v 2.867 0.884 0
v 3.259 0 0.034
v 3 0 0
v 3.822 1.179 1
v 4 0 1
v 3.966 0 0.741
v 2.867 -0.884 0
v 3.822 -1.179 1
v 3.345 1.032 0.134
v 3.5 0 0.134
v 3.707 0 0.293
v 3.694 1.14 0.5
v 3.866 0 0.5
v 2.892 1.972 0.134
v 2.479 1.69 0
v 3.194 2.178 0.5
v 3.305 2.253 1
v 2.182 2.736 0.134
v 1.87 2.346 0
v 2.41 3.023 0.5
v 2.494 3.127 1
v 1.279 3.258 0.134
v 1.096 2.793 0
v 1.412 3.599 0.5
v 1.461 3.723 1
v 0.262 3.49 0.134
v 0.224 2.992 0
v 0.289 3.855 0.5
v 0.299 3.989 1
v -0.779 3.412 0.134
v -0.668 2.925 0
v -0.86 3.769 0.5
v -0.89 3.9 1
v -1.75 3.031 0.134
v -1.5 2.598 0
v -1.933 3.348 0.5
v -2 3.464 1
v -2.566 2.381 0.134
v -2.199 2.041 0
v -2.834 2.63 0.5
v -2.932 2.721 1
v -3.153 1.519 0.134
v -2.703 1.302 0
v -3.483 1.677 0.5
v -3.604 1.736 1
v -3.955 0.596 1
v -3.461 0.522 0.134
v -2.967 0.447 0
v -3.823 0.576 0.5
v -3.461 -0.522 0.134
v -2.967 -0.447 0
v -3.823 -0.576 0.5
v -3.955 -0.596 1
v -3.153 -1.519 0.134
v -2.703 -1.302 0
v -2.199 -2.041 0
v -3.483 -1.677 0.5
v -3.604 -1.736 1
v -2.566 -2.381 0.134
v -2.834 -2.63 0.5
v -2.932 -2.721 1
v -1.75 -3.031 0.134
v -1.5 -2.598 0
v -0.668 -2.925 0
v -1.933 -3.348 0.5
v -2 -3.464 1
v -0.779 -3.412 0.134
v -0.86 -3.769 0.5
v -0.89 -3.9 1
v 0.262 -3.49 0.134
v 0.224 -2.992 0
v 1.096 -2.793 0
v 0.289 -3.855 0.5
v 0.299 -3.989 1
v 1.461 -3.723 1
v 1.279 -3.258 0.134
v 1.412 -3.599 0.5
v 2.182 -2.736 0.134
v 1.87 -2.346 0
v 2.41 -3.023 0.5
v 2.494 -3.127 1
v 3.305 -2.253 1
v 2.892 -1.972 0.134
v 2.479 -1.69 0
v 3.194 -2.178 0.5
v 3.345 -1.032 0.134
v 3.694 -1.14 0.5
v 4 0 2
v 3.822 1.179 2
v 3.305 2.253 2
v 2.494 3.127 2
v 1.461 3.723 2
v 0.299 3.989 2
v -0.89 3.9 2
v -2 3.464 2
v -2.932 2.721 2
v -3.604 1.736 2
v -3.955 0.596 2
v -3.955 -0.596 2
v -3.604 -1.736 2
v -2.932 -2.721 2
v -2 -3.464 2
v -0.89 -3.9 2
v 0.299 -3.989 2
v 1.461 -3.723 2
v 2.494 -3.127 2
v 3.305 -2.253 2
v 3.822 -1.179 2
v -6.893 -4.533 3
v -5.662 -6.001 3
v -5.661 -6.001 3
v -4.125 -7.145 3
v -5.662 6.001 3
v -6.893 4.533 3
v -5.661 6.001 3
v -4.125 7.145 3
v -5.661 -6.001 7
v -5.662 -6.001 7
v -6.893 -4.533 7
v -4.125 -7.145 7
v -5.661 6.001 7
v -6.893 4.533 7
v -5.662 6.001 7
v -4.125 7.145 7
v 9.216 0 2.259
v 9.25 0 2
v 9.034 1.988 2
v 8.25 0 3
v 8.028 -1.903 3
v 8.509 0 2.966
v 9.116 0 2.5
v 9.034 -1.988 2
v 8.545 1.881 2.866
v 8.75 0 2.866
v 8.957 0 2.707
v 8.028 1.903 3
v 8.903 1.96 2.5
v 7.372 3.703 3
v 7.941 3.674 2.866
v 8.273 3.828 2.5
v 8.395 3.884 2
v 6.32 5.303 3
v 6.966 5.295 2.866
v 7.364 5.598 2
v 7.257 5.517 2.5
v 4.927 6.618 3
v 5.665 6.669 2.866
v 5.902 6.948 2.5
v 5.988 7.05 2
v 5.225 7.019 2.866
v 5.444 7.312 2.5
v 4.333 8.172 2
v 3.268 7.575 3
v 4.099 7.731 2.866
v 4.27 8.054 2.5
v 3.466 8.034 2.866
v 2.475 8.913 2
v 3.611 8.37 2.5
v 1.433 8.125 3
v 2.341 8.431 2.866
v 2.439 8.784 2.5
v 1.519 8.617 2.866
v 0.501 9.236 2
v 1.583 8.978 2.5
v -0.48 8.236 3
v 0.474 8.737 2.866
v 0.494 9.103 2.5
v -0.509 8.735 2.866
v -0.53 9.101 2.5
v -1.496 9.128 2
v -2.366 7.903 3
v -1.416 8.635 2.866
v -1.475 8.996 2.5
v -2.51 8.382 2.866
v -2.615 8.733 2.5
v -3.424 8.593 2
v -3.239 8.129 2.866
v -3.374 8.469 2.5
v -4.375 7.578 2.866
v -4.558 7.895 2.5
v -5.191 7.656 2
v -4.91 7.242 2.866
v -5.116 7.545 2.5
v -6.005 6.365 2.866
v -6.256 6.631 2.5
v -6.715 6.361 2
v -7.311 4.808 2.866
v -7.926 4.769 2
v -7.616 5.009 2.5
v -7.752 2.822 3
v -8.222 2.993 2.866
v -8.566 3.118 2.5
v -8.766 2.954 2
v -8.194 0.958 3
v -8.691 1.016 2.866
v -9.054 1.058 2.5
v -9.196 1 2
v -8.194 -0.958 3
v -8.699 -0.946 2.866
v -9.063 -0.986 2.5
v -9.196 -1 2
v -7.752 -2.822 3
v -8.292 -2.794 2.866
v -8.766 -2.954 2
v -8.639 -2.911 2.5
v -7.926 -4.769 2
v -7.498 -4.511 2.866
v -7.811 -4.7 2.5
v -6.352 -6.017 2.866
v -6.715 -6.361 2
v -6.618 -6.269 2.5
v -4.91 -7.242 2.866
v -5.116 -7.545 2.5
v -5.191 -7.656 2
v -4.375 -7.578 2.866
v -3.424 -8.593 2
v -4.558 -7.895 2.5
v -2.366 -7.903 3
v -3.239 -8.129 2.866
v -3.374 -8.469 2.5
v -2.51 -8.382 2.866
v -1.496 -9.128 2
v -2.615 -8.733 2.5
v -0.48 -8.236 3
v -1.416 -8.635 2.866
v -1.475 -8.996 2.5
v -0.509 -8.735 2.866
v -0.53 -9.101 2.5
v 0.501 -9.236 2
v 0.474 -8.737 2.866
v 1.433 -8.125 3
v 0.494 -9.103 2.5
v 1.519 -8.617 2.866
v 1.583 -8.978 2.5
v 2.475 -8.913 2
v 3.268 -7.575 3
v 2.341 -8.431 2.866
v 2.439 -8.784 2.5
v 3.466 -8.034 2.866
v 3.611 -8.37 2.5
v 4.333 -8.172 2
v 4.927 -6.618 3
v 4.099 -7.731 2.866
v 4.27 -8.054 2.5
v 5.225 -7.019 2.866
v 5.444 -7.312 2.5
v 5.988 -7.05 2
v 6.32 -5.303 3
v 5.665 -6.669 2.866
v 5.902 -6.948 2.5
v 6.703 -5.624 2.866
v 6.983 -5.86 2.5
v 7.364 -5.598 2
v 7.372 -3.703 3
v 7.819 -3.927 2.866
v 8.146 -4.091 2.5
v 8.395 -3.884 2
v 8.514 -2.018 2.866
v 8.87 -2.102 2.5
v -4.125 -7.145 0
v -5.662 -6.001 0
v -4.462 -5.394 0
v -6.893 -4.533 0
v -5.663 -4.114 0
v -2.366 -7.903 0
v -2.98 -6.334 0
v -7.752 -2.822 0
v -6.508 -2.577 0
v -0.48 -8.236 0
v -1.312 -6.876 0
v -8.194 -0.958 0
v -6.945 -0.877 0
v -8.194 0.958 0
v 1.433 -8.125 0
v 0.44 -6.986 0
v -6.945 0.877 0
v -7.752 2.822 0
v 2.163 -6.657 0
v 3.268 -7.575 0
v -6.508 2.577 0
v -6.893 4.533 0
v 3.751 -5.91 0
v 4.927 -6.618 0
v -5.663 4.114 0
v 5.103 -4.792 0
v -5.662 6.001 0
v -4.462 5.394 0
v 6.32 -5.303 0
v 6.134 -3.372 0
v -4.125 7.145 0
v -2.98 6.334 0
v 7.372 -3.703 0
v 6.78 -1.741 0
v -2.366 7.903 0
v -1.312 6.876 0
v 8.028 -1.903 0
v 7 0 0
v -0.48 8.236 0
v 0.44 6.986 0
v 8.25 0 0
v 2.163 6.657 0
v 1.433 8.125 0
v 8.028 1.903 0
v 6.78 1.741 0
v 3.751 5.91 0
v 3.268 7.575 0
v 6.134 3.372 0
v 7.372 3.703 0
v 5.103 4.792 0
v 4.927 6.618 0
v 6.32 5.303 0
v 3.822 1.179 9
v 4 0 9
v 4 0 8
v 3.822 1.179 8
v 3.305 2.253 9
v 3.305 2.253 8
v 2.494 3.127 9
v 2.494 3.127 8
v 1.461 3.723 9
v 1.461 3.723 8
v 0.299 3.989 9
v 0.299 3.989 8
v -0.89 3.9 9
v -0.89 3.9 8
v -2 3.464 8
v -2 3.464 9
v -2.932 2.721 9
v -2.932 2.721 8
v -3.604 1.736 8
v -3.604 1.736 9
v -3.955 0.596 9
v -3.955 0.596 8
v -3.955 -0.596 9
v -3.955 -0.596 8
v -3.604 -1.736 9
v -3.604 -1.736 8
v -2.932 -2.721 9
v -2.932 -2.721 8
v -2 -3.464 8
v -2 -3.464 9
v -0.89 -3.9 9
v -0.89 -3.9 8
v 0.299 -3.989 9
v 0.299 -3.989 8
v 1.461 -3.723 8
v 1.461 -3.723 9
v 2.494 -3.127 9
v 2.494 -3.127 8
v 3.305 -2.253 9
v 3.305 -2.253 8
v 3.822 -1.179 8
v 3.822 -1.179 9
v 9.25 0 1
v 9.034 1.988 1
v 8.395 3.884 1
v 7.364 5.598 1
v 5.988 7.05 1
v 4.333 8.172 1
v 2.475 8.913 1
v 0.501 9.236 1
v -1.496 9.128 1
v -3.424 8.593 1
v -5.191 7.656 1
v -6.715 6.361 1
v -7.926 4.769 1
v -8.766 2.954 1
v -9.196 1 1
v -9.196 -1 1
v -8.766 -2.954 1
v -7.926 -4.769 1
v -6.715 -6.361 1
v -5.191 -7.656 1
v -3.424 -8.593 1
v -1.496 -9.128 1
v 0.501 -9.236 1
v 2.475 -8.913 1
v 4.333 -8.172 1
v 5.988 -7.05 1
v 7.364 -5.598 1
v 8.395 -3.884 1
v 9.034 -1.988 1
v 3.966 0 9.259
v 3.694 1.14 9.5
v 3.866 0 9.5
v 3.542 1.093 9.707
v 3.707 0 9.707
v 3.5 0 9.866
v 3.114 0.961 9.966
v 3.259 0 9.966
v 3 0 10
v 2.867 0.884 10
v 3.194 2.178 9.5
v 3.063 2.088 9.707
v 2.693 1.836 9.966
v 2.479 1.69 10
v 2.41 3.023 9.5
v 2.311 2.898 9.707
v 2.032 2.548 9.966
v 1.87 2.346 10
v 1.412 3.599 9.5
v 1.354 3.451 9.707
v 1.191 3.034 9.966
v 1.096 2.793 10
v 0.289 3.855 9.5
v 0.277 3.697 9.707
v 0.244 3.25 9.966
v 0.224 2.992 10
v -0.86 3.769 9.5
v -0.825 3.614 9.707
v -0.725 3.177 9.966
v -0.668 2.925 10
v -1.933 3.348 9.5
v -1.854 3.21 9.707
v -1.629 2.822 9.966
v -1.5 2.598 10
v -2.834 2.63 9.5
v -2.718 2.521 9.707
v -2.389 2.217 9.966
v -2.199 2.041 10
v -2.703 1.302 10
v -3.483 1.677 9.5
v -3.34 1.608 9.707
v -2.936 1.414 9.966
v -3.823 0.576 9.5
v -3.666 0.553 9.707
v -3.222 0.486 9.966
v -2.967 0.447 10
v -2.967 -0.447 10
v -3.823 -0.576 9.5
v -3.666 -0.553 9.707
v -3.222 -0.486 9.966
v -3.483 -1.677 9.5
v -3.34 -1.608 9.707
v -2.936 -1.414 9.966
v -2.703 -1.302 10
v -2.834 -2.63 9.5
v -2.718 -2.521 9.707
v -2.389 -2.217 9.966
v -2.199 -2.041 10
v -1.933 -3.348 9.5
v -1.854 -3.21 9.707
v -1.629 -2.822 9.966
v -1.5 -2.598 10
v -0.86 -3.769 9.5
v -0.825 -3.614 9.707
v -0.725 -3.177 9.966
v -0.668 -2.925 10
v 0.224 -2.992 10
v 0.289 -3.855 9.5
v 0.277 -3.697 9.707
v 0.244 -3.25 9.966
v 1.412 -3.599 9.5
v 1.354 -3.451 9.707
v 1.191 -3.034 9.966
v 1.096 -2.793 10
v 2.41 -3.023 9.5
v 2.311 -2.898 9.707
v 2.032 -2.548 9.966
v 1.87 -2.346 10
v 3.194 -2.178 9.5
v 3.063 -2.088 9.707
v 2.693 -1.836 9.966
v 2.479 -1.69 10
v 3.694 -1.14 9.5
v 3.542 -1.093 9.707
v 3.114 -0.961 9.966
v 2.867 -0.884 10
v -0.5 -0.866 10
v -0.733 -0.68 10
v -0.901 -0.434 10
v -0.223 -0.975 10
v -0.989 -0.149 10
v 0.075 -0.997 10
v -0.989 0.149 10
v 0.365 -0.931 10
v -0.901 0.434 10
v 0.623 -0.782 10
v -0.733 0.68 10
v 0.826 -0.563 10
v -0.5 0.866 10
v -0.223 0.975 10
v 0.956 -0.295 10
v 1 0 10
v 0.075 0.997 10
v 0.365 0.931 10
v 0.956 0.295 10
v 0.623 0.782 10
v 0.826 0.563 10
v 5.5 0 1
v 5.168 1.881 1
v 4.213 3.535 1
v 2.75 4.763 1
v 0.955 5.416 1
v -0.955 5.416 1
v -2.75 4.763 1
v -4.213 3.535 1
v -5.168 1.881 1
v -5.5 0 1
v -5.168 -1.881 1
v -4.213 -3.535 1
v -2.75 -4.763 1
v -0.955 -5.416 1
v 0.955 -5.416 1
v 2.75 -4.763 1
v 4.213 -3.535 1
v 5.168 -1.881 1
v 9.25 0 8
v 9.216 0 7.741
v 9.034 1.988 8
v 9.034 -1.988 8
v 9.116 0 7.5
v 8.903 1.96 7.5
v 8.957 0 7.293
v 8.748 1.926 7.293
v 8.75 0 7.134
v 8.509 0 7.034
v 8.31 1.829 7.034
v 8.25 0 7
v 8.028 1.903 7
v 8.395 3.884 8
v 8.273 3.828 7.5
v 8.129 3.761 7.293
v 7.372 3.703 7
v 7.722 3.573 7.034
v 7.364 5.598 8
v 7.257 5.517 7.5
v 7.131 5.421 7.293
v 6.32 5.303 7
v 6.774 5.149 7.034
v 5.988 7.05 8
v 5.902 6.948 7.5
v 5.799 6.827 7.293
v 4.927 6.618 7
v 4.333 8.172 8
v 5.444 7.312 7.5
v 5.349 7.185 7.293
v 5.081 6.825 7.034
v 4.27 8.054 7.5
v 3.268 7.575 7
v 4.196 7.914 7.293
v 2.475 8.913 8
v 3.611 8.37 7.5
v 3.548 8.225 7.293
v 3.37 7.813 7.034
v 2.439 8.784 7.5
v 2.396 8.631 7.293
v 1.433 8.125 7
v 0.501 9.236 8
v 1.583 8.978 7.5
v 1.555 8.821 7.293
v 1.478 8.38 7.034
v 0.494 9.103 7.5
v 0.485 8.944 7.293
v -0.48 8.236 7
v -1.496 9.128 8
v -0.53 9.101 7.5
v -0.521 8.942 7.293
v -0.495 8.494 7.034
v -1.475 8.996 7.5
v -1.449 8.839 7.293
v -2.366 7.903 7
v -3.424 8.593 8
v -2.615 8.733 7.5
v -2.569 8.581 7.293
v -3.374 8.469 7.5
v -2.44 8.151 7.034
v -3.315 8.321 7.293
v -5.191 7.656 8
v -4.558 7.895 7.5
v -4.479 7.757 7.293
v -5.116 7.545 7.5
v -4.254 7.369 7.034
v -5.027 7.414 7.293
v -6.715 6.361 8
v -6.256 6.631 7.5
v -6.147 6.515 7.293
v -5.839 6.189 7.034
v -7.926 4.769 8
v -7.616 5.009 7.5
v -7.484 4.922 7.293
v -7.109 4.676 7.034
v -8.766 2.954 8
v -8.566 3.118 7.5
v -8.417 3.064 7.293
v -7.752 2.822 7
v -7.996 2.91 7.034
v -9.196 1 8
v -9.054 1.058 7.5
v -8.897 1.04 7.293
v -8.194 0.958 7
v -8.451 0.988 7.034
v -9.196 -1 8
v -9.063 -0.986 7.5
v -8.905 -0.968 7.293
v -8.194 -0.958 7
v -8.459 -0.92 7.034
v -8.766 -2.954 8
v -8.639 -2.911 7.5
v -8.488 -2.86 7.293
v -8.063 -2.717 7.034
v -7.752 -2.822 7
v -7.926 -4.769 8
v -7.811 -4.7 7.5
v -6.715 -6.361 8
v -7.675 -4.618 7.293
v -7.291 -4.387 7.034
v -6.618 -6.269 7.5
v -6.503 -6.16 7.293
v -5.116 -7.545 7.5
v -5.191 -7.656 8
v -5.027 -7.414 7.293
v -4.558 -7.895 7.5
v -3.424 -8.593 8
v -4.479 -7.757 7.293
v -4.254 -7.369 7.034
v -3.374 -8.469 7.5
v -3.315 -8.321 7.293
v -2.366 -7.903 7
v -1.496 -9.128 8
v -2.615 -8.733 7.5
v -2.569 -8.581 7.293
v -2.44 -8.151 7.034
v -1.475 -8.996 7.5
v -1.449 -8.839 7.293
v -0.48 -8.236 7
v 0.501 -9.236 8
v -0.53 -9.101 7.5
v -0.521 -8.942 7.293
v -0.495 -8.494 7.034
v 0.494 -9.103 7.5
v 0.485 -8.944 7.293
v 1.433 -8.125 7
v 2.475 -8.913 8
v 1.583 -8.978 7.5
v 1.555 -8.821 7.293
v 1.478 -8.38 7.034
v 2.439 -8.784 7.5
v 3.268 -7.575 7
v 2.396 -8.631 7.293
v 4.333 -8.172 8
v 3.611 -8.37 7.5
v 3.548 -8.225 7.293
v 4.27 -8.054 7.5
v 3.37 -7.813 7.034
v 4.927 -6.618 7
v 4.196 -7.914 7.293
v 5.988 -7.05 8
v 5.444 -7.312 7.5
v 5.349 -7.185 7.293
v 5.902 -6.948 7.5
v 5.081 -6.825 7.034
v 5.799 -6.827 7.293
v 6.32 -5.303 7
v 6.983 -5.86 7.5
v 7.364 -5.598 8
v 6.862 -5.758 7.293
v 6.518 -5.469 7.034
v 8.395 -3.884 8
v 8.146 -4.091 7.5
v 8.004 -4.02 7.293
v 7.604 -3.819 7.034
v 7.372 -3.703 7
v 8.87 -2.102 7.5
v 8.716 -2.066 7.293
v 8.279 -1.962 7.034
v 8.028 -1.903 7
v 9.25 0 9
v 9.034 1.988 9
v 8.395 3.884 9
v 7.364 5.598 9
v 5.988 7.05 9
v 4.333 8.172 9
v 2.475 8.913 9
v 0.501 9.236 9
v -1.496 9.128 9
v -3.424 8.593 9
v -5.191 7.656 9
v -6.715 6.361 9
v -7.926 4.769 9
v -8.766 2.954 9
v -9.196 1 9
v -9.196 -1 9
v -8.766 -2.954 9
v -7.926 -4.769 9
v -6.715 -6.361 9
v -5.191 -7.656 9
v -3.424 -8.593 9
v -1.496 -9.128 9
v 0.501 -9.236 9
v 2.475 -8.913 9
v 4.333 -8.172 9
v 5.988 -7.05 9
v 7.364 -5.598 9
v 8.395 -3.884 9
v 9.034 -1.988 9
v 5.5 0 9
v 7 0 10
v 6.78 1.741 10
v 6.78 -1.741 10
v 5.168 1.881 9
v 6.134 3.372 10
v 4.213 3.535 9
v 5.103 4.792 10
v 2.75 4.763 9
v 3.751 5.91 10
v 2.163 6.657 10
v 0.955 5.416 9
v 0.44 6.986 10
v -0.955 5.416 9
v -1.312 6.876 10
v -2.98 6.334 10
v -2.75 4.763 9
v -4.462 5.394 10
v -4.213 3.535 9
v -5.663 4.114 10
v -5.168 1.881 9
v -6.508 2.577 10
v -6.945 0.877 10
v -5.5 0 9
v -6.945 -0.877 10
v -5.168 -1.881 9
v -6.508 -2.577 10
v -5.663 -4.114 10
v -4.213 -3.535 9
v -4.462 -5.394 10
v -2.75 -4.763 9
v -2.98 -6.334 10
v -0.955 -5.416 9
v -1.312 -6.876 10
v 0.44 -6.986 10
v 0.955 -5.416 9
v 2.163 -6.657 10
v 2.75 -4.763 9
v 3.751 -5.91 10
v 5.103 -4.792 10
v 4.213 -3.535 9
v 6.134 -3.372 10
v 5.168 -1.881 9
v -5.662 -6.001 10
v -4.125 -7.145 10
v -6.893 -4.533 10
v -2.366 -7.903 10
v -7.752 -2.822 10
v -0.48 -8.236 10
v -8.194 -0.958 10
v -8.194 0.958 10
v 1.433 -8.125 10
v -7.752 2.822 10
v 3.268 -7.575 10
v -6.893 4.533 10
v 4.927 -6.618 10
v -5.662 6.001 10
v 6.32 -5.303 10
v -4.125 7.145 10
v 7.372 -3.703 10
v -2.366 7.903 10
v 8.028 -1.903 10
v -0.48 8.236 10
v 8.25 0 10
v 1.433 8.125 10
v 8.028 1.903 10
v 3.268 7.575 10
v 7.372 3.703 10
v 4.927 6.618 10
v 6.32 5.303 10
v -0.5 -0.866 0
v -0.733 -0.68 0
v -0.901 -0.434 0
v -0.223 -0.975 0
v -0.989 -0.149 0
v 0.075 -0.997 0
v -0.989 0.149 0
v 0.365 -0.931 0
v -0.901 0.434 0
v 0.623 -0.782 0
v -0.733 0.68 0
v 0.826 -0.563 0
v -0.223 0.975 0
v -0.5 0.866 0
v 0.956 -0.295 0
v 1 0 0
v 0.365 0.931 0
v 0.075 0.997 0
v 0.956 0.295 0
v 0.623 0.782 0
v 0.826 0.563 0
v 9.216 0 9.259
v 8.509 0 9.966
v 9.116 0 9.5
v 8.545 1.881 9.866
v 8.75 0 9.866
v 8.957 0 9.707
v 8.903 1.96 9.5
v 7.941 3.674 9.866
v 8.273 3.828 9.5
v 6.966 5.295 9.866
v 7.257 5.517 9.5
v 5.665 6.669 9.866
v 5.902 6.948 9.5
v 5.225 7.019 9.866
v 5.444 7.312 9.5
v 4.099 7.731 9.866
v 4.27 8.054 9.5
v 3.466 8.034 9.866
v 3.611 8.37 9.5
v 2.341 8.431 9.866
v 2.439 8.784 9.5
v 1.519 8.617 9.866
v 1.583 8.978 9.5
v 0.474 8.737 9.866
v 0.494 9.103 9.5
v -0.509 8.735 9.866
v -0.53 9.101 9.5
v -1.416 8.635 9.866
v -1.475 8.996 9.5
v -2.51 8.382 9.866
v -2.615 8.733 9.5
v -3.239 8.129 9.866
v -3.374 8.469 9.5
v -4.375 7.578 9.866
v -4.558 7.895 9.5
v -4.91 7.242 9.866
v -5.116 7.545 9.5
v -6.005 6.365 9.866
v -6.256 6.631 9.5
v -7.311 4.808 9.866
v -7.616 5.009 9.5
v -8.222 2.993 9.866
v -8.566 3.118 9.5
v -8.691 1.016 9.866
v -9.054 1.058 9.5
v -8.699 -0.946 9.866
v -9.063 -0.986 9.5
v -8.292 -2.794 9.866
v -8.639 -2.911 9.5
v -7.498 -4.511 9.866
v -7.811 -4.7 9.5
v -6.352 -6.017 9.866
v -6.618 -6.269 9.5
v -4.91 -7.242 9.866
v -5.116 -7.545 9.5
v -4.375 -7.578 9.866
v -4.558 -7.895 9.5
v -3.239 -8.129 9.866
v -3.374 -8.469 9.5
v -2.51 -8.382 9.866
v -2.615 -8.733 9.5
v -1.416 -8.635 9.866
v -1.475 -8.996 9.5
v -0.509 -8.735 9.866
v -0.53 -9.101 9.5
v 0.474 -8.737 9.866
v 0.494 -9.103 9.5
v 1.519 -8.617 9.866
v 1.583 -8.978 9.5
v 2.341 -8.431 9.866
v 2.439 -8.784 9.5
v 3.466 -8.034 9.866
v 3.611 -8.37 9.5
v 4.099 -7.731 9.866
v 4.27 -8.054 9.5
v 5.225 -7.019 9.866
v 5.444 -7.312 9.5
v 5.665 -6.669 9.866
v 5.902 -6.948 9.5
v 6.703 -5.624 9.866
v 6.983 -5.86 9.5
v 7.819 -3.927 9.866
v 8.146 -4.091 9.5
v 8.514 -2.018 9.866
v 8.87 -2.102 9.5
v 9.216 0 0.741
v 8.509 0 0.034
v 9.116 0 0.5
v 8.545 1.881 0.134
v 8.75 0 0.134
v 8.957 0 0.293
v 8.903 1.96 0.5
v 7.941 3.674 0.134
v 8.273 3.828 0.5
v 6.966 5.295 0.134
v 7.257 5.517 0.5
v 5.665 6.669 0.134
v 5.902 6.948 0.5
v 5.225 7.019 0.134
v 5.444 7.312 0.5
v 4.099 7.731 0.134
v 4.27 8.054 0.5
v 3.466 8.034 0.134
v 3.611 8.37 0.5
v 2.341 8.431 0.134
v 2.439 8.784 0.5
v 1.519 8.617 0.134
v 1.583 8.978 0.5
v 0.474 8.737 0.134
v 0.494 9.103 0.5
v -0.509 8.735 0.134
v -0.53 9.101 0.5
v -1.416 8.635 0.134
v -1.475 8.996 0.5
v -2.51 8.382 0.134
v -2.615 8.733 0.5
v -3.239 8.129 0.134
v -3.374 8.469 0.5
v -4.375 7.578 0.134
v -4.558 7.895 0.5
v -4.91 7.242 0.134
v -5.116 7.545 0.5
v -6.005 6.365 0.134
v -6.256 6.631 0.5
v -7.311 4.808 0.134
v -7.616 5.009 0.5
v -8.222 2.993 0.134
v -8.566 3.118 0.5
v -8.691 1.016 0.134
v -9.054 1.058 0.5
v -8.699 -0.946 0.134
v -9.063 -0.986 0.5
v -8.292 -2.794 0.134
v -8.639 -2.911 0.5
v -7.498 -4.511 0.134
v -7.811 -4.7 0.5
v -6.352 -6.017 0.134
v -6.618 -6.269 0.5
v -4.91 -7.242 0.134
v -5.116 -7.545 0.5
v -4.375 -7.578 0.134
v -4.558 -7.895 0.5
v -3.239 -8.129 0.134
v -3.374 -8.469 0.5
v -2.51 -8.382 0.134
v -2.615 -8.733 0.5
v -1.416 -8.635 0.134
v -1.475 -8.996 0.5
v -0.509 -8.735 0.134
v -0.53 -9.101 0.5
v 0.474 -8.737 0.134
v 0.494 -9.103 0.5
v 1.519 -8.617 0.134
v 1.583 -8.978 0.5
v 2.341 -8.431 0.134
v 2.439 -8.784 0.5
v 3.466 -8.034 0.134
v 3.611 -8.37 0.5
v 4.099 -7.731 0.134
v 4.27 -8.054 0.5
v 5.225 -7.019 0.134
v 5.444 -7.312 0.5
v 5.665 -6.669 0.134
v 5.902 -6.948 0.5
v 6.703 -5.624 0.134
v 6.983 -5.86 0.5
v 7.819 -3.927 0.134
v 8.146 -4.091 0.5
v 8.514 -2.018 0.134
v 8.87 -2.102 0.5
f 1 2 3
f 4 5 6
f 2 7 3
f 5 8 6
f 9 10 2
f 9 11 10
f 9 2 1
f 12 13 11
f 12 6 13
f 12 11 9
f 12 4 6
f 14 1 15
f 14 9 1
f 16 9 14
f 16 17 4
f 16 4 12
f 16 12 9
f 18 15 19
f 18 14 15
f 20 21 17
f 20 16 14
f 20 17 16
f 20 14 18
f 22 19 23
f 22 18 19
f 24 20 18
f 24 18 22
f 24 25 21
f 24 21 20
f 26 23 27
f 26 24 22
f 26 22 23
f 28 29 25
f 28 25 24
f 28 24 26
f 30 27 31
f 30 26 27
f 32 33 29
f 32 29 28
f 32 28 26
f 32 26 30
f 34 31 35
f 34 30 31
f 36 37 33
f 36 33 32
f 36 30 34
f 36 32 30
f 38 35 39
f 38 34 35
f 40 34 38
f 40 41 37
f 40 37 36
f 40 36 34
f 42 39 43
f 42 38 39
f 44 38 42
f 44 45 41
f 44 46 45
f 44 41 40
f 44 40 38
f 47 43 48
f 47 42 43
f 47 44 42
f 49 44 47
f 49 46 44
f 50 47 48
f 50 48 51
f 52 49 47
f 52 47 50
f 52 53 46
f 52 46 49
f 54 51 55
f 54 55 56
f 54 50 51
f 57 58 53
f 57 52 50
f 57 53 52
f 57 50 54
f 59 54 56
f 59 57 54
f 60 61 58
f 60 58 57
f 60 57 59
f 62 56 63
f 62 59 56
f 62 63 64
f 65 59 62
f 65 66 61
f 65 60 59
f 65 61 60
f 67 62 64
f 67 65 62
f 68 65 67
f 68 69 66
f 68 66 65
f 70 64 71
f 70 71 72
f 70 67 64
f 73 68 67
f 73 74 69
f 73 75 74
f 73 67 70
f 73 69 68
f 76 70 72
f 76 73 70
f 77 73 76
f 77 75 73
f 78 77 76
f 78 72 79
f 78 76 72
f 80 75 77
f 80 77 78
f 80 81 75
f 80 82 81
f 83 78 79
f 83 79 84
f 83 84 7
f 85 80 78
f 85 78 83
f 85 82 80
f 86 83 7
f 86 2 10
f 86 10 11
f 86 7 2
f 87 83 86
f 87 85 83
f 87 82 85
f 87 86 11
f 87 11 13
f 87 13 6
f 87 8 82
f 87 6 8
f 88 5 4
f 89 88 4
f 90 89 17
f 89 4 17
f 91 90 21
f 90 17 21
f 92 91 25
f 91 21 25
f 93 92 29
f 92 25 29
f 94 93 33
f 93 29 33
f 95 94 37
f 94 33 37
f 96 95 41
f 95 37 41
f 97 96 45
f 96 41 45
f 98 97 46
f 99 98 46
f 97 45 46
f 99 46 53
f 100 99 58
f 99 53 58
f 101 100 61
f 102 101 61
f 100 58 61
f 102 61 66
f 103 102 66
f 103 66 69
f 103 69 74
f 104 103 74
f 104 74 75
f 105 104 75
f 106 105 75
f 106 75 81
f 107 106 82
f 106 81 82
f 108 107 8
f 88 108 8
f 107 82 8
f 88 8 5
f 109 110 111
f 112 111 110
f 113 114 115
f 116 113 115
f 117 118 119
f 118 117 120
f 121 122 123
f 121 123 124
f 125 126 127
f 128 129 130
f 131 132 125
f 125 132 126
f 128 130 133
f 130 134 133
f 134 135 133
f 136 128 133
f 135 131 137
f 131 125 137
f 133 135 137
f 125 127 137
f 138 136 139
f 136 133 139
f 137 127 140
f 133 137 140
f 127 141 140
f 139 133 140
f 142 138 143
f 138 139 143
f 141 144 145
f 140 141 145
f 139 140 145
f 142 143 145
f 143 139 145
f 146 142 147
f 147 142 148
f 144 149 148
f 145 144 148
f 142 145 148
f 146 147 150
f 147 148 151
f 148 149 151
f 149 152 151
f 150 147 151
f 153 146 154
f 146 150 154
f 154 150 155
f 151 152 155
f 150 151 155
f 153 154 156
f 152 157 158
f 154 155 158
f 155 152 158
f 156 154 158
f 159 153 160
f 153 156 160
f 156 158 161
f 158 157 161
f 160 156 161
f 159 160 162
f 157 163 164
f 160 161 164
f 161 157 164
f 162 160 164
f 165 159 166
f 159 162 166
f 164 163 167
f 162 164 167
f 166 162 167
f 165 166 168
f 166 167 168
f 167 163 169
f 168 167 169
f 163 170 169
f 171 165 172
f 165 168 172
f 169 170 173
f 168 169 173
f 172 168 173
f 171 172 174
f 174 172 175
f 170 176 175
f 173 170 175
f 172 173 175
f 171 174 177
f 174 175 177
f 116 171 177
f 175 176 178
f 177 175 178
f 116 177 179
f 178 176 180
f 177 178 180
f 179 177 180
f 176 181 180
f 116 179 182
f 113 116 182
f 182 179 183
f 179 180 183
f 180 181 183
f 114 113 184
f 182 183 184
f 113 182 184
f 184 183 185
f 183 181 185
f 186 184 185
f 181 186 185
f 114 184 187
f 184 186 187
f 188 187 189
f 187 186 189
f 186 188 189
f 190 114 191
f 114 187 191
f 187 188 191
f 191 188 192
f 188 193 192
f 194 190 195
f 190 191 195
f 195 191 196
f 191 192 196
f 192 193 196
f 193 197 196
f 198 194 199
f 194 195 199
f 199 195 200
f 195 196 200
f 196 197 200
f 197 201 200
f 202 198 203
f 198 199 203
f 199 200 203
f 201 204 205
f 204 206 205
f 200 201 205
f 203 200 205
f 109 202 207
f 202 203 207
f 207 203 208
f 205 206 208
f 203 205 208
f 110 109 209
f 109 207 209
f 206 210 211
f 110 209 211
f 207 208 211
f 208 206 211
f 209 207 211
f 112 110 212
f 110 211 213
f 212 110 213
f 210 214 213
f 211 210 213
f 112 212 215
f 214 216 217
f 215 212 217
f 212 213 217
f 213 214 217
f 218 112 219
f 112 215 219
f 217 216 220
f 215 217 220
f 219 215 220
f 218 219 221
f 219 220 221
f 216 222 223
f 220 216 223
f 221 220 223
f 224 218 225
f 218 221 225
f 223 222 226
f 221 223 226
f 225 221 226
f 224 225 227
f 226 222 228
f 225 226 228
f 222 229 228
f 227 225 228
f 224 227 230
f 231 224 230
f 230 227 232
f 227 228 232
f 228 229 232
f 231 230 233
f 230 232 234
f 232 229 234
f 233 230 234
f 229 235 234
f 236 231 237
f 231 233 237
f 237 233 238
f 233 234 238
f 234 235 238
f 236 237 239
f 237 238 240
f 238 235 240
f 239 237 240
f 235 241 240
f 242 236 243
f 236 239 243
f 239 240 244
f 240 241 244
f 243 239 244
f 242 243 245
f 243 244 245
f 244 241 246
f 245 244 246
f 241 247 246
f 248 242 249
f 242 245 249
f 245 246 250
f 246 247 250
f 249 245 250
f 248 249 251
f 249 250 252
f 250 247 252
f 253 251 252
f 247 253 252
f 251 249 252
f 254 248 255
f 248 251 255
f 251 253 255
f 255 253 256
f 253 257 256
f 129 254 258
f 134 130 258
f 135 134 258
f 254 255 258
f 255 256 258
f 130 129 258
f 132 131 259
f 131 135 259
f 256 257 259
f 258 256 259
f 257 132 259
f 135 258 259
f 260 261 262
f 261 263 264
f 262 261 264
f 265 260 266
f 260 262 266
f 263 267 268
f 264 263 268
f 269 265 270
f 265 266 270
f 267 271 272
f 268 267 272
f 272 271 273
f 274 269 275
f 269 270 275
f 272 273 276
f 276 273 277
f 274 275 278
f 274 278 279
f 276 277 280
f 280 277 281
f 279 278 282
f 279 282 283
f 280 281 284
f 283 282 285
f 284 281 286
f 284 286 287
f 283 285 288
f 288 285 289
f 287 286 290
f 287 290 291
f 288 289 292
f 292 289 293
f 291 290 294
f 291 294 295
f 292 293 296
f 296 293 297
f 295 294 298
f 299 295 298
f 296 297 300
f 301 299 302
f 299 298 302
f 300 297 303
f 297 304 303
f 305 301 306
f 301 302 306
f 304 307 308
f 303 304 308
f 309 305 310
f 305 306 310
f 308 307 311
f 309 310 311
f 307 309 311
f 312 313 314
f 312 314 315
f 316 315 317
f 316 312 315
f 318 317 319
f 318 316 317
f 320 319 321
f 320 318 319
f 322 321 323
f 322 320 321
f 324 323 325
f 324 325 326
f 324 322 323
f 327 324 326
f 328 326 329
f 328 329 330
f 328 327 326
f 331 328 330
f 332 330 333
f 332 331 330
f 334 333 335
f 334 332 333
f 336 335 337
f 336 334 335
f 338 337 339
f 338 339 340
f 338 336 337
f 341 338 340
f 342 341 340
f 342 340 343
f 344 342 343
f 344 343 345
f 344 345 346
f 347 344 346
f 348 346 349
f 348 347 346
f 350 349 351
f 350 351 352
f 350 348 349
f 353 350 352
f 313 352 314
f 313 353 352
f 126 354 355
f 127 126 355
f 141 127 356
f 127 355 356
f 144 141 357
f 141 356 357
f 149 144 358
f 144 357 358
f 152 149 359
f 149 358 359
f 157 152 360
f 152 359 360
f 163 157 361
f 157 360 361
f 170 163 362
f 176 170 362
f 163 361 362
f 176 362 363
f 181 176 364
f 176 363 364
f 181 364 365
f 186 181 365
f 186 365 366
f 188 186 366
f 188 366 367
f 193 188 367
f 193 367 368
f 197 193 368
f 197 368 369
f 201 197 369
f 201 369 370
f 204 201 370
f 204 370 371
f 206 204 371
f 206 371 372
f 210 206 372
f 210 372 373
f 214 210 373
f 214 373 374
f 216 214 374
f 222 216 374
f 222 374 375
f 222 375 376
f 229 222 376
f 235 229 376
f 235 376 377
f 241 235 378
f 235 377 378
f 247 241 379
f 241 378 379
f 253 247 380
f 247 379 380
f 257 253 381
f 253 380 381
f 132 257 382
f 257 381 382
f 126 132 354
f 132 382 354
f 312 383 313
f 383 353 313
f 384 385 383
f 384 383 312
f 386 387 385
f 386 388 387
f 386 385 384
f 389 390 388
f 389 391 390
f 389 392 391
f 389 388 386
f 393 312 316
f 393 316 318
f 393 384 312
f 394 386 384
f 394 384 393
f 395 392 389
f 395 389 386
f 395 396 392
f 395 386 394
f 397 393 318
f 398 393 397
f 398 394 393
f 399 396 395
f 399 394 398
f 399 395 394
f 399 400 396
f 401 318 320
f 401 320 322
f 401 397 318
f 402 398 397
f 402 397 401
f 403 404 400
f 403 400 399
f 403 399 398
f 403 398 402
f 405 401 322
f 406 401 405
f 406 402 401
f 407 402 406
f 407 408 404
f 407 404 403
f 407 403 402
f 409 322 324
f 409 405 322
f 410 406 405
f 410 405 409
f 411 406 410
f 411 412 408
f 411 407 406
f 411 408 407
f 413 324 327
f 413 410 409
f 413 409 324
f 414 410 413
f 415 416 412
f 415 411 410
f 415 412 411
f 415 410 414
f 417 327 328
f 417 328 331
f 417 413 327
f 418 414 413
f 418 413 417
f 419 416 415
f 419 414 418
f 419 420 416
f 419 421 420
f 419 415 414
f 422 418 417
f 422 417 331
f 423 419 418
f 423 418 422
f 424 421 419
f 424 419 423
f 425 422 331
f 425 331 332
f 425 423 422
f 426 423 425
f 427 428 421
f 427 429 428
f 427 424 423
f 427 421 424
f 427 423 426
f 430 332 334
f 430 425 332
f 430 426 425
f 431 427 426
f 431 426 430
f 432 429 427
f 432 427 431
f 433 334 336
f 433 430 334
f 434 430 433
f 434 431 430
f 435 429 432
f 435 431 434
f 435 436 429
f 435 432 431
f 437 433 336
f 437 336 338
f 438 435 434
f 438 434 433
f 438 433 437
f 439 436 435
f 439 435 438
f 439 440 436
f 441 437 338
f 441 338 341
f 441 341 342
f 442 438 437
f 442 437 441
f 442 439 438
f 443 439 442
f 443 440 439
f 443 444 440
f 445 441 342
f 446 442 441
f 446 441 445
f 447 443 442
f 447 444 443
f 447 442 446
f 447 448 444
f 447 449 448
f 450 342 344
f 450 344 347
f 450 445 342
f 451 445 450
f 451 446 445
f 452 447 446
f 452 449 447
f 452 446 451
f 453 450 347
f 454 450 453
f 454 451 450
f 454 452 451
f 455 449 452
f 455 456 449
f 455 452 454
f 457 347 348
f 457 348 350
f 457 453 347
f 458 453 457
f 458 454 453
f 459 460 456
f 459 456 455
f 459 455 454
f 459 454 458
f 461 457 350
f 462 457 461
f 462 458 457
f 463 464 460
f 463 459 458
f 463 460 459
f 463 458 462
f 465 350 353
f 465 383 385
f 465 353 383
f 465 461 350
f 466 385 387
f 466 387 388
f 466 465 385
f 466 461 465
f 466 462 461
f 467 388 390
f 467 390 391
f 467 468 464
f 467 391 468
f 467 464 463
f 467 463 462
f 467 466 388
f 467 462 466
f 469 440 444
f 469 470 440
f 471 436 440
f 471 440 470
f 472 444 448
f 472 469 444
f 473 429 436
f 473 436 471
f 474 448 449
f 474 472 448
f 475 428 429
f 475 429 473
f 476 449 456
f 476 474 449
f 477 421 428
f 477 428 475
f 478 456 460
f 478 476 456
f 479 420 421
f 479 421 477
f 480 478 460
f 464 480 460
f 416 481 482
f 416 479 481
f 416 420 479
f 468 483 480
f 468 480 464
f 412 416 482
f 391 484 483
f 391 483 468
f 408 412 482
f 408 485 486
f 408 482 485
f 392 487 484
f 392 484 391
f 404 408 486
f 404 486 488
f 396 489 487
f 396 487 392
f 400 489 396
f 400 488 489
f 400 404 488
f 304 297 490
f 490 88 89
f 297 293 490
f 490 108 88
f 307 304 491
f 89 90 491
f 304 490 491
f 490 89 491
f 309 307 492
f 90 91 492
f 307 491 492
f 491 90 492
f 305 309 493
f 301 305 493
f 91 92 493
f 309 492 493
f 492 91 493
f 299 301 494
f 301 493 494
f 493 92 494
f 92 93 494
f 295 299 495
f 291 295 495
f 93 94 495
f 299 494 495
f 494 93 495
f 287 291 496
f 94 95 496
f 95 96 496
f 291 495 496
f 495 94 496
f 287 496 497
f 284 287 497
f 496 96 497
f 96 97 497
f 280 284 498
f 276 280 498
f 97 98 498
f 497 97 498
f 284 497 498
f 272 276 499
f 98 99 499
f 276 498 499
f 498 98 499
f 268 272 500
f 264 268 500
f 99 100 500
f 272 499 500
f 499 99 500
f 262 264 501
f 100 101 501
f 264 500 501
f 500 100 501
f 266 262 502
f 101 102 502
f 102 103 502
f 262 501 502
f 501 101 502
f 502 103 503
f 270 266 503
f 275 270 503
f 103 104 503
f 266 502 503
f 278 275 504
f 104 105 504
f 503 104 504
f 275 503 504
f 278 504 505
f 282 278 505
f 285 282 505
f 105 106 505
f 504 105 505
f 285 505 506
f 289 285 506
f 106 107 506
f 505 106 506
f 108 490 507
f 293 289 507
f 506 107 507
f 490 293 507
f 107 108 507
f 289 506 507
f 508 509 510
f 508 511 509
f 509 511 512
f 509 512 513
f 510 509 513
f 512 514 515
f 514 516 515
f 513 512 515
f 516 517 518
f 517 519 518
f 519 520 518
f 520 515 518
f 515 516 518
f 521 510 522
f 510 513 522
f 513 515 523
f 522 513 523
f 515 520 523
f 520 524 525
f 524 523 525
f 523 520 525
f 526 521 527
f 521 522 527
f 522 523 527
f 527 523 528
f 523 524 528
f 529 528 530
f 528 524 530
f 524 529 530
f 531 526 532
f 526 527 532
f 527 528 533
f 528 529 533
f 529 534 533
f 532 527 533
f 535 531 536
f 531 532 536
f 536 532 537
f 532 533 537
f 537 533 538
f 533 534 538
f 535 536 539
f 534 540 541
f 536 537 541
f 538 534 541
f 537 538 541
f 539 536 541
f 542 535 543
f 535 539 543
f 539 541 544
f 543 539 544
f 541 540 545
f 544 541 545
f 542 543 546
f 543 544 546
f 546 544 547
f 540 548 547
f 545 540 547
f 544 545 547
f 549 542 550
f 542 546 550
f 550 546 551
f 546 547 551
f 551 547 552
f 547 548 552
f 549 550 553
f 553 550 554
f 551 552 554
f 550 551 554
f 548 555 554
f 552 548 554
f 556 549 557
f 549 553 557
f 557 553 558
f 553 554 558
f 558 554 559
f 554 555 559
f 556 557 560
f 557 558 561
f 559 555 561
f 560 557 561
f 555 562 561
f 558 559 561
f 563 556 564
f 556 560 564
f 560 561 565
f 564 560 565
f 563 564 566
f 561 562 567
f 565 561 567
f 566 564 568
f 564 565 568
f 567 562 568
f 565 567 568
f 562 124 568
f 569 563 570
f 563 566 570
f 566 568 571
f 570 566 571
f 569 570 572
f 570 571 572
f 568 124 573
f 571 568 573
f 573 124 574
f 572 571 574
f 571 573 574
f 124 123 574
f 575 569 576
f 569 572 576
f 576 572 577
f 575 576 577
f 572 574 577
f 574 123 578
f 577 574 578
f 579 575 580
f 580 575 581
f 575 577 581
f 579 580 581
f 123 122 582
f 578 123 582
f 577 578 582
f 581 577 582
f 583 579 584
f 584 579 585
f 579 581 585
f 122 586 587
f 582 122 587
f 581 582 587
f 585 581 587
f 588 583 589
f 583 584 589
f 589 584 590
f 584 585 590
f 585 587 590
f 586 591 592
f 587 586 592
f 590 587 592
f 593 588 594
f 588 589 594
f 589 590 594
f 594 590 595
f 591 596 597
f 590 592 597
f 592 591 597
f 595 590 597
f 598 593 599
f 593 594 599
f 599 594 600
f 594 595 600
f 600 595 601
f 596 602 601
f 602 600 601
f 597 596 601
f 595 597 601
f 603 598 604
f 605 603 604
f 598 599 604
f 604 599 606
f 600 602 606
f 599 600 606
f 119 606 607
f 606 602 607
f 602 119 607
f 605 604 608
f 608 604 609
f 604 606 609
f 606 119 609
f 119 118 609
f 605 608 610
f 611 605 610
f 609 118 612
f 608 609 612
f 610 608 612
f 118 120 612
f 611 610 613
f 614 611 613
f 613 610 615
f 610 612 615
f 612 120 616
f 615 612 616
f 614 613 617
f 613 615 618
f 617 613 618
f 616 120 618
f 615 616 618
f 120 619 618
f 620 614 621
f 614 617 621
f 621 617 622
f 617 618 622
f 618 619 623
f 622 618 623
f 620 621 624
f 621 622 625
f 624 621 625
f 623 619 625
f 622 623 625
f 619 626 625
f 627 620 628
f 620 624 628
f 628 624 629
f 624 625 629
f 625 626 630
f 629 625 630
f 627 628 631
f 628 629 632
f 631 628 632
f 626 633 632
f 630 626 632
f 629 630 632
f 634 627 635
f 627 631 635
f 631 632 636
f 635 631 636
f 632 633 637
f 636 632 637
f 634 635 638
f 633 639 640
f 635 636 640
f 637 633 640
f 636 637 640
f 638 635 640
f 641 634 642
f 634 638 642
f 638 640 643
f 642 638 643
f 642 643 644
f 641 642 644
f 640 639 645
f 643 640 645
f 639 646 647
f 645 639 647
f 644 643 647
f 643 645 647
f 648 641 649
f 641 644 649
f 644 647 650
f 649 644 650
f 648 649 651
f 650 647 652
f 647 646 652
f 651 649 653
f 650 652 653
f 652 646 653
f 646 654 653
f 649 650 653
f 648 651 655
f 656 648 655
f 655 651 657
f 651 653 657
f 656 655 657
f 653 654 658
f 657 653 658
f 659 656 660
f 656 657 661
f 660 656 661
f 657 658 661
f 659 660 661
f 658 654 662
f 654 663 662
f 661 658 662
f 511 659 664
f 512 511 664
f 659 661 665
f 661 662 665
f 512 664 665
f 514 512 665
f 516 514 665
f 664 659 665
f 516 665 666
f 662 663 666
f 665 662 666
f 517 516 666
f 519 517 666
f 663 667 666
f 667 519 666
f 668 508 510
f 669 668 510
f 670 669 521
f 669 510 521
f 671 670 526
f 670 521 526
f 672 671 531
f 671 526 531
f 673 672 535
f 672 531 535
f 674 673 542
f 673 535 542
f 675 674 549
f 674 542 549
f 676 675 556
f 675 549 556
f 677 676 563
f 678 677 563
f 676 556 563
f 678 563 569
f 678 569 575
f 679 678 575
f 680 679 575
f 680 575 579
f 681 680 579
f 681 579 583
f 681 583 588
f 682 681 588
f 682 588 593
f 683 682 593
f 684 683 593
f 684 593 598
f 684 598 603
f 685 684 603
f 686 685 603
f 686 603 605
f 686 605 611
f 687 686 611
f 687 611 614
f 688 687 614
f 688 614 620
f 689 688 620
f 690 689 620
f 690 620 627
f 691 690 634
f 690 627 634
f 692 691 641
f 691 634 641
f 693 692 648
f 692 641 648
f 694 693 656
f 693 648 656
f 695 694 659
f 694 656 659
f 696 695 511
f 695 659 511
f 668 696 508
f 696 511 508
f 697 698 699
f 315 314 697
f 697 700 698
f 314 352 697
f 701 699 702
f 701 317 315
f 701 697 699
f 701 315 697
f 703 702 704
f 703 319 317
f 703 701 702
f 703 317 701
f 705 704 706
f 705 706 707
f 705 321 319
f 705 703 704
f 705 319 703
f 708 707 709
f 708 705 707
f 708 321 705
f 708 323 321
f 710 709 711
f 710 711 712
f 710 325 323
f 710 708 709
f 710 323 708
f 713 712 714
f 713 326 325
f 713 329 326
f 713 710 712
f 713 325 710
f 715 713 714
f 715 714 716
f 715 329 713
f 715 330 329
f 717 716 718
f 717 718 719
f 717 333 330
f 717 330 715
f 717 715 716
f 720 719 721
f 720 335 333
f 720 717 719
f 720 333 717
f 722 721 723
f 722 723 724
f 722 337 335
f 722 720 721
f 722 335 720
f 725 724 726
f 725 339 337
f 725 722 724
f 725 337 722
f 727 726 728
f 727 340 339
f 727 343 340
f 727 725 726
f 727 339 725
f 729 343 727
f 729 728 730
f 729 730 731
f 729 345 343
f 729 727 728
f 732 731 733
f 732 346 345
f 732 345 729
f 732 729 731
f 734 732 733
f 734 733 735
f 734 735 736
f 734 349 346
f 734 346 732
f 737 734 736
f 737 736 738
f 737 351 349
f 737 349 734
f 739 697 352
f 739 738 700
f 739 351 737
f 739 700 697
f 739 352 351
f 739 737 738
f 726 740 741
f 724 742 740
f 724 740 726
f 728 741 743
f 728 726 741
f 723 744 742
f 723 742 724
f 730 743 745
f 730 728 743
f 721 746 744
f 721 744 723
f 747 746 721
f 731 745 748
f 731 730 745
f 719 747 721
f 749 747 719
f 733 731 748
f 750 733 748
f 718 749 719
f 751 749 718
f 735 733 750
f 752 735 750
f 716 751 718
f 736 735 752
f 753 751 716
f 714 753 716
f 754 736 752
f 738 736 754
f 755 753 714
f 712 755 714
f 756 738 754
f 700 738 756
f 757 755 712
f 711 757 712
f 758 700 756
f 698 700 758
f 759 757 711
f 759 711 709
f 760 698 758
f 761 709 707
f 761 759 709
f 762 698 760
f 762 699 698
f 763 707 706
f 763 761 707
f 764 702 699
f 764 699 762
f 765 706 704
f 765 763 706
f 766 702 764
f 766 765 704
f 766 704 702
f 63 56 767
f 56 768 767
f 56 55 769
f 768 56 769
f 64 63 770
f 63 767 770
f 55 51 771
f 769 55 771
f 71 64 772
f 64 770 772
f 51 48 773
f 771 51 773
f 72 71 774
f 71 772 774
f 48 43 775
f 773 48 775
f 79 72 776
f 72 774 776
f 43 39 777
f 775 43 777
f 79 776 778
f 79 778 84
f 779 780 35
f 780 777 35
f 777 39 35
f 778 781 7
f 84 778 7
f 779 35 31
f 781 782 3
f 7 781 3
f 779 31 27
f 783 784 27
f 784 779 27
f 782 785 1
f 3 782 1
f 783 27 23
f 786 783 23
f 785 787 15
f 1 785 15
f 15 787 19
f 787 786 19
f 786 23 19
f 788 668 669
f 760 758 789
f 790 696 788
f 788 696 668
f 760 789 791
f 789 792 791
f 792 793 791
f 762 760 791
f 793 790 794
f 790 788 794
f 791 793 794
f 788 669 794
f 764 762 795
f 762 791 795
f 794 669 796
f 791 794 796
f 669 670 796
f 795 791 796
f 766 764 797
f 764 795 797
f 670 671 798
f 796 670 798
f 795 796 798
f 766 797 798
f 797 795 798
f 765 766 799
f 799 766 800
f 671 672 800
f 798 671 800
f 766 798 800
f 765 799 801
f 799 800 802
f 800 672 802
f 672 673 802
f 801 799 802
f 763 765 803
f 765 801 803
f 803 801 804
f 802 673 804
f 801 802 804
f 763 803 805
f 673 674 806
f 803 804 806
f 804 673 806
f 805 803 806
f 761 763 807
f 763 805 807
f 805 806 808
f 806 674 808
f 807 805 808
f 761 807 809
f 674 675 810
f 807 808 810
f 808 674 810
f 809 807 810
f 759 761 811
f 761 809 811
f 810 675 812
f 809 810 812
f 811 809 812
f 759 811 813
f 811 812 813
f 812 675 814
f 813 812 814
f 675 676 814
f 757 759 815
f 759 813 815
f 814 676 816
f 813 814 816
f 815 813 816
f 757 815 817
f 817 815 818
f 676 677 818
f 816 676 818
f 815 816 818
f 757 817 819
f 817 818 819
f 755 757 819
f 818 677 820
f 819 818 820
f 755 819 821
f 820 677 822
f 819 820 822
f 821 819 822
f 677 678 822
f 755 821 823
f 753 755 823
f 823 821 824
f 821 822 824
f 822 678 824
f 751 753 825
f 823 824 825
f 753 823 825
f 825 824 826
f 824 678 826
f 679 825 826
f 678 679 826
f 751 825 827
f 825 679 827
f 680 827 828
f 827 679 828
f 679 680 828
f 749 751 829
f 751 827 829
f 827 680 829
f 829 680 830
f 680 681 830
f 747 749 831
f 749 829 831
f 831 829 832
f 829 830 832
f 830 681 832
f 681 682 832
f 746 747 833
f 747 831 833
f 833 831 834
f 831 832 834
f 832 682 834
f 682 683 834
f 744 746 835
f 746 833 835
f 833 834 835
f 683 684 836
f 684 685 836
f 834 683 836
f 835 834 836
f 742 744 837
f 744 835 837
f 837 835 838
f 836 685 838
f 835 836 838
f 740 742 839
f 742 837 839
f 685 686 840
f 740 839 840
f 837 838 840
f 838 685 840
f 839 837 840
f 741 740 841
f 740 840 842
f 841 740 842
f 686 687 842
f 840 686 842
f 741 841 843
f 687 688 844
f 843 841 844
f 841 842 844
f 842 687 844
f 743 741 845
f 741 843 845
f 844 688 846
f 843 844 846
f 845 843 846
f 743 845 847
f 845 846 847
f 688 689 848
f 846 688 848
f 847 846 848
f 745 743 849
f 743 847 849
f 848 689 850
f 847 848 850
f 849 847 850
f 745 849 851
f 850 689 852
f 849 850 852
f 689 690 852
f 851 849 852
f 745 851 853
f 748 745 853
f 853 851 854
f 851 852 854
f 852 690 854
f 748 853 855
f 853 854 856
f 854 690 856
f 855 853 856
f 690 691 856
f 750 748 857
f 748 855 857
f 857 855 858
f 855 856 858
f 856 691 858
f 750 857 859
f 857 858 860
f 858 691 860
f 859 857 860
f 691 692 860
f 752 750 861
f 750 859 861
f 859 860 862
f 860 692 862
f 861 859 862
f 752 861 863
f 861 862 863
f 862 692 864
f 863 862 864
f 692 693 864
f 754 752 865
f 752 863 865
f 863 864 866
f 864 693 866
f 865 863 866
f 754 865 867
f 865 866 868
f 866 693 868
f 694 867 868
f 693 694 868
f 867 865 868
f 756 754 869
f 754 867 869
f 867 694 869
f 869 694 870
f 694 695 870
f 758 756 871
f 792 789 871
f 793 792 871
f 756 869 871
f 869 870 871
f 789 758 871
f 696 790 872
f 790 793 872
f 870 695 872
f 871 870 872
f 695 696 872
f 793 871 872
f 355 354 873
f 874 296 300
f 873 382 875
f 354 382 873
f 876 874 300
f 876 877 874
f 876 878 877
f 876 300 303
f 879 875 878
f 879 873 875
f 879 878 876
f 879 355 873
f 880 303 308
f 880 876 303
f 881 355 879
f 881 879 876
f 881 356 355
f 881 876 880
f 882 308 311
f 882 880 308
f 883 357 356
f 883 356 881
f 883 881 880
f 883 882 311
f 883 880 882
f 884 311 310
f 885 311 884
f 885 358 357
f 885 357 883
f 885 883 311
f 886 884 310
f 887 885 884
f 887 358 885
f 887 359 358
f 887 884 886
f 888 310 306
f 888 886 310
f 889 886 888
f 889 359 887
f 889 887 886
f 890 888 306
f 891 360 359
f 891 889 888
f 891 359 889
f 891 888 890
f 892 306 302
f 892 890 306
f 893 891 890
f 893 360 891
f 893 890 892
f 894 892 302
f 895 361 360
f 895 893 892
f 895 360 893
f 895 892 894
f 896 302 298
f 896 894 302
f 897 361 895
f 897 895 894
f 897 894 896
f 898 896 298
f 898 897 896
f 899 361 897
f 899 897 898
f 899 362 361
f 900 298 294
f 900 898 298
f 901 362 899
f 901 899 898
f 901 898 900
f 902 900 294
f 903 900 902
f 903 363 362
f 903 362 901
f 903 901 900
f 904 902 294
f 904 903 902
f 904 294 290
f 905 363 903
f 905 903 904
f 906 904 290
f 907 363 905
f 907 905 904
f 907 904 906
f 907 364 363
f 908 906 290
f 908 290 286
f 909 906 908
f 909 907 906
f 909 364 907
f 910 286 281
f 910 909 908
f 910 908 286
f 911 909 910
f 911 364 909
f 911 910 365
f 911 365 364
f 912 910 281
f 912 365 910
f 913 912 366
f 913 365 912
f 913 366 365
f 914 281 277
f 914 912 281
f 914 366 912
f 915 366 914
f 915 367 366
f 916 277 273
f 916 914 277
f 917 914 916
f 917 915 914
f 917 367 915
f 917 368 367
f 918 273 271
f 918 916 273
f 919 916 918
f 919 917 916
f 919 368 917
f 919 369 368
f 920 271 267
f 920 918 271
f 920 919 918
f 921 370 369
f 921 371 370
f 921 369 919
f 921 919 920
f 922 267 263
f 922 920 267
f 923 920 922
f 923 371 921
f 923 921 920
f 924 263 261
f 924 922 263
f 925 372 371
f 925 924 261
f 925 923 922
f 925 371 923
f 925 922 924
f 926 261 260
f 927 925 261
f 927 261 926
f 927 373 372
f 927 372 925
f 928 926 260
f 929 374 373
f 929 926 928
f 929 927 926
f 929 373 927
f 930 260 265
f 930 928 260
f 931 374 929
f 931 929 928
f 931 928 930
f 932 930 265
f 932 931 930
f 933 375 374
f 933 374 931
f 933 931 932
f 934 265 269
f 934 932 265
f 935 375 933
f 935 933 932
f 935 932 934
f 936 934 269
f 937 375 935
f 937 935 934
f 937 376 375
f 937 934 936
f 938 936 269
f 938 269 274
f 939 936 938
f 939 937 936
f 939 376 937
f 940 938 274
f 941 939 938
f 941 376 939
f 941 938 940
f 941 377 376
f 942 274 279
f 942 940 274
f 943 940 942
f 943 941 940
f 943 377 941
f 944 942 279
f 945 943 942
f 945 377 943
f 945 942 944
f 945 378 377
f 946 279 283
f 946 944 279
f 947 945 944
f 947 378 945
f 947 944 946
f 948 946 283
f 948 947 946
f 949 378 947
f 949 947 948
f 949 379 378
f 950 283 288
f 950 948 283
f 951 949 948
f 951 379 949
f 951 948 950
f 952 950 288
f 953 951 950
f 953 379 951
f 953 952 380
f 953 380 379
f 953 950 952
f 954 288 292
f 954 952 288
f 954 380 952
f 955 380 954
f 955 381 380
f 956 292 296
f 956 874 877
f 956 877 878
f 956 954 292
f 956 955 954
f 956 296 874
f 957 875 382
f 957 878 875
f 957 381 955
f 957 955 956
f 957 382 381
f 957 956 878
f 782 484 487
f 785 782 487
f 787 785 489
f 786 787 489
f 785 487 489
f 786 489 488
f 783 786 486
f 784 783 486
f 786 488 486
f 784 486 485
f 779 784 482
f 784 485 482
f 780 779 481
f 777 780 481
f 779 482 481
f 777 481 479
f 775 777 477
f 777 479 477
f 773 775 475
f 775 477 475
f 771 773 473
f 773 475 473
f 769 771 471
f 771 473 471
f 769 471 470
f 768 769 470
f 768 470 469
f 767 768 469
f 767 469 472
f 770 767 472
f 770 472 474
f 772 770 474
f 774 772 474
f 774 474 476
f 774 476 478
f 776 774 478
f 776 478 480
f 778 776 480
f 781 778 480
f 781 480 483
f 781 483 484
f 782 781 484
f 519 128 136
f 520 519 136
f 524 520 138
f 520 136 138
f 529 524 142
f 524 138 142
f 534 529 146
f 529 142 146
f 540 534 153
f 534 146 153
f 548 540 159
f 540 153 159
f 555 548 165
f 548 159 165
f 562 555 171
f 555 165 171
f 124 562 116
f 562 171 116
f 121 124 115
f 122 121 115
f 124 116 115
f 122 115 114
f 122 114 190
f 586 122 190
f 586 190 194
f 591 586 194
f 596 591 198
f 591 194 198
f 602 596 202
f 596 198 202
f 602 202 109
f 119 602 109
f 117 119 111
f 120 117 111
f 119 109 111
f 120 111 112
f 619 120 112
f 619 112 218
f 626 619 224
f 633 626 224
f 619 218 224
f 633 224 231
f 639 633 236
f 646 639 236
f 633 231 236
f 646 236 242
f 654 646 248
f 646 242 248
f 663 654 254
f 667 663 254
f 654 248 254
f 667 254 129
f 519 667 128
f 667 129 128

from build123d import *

# Parameters (mm, degrees)
F0_R      = 9.25
F0_R_2    = 1
F1_DEPTH  = 10
F4_R      = 7
F3_R      = 4
F8_R      = 7
F7_R      = 4
F11_R     = 4
F11_R_2   = 1
F12_DEPTH = 2
F14_R     = 9.25
F14_R_2   = 8.25
F15_DEPTH = 4
F16_R     = 0.99999


# Not quite as in the source:
# - a fillet or chamfer is up to 0.001 mm smaller than in the source, because OpenCascade refuses the exact size
# - a feature of the source that left no trace in its solid (it failed there, or was rolled back) is left out
# - a pattern or mirror of a feature is missing from the dataset's text; its kind, count and spacing are read off the source's solid


with BuildPart() as f1:
    # F0 (on Top) → F1 (new body)
    with BuildSketch(Plane.XY):
        Circle(F0_R)
        Circle(F0_R_2, mode=Mode.SUBTRACT)
    extrude(amount=F1_DEPTH)

    # F4 (on face) → F5 section 0
    with BuildSketch(Plane.XY.offset(10)):
        Circle(F4_R)
    # F3 (on offset) → F5 section 1
    with BuildSketch(Plane.XY.offset(8)):
        Circle(F3_R)
    loft(mode=Mode.SUBTRACT)

    # F8 (on face) → F9 section 0
    with BuildSketch(Plane.XY):
        Circle(F8_R)
    # F7 (on offset) → F9 section 1
    with BuildSketch(Plane.XY.offset(2)):
        Circle(F7_R)
    loft(mode=Mode.SUBTRACT)

    # F11 (on face) → F12 (join, through all)
    with BuildSketch(Plane.XY):
        Circle(F11_R)
        Circle(F11_R_2, mode=Mode.SUBTRACT)
    f12 = extrude(amount=F12_DEPTH)

    # F12_copies: F12 across plane
    add(f12.mirror(Plane.XY.offset(5)))

    # F14 (on offset) → F15 (cut)
    with BuildSketch(Plane.XY.offset(3)):
        Circle(F14_R)
        Circle(F14_R_2, mode=Mode.SUBTRACT)
    extrude(amount=F15_DEPTH, mode=Mode.SUBTRACT)

    # F16 (radius 1 in the source; OpenCascade refuses exactly that, so slightly less here)
    f16_edges = [f1.edges().sort_by_distance(p)[0] for p in [
        (-4, 0, 0),
        (-9.25, 0, 10),
        (-9.25, 0, 0),
        (-9.25, 0, 7),
        (-9.25, 0, 3),
        (-4, 0, 10),
    ]]
    fillet(f16_edges, radius=F16_R)


solid = f1.part
